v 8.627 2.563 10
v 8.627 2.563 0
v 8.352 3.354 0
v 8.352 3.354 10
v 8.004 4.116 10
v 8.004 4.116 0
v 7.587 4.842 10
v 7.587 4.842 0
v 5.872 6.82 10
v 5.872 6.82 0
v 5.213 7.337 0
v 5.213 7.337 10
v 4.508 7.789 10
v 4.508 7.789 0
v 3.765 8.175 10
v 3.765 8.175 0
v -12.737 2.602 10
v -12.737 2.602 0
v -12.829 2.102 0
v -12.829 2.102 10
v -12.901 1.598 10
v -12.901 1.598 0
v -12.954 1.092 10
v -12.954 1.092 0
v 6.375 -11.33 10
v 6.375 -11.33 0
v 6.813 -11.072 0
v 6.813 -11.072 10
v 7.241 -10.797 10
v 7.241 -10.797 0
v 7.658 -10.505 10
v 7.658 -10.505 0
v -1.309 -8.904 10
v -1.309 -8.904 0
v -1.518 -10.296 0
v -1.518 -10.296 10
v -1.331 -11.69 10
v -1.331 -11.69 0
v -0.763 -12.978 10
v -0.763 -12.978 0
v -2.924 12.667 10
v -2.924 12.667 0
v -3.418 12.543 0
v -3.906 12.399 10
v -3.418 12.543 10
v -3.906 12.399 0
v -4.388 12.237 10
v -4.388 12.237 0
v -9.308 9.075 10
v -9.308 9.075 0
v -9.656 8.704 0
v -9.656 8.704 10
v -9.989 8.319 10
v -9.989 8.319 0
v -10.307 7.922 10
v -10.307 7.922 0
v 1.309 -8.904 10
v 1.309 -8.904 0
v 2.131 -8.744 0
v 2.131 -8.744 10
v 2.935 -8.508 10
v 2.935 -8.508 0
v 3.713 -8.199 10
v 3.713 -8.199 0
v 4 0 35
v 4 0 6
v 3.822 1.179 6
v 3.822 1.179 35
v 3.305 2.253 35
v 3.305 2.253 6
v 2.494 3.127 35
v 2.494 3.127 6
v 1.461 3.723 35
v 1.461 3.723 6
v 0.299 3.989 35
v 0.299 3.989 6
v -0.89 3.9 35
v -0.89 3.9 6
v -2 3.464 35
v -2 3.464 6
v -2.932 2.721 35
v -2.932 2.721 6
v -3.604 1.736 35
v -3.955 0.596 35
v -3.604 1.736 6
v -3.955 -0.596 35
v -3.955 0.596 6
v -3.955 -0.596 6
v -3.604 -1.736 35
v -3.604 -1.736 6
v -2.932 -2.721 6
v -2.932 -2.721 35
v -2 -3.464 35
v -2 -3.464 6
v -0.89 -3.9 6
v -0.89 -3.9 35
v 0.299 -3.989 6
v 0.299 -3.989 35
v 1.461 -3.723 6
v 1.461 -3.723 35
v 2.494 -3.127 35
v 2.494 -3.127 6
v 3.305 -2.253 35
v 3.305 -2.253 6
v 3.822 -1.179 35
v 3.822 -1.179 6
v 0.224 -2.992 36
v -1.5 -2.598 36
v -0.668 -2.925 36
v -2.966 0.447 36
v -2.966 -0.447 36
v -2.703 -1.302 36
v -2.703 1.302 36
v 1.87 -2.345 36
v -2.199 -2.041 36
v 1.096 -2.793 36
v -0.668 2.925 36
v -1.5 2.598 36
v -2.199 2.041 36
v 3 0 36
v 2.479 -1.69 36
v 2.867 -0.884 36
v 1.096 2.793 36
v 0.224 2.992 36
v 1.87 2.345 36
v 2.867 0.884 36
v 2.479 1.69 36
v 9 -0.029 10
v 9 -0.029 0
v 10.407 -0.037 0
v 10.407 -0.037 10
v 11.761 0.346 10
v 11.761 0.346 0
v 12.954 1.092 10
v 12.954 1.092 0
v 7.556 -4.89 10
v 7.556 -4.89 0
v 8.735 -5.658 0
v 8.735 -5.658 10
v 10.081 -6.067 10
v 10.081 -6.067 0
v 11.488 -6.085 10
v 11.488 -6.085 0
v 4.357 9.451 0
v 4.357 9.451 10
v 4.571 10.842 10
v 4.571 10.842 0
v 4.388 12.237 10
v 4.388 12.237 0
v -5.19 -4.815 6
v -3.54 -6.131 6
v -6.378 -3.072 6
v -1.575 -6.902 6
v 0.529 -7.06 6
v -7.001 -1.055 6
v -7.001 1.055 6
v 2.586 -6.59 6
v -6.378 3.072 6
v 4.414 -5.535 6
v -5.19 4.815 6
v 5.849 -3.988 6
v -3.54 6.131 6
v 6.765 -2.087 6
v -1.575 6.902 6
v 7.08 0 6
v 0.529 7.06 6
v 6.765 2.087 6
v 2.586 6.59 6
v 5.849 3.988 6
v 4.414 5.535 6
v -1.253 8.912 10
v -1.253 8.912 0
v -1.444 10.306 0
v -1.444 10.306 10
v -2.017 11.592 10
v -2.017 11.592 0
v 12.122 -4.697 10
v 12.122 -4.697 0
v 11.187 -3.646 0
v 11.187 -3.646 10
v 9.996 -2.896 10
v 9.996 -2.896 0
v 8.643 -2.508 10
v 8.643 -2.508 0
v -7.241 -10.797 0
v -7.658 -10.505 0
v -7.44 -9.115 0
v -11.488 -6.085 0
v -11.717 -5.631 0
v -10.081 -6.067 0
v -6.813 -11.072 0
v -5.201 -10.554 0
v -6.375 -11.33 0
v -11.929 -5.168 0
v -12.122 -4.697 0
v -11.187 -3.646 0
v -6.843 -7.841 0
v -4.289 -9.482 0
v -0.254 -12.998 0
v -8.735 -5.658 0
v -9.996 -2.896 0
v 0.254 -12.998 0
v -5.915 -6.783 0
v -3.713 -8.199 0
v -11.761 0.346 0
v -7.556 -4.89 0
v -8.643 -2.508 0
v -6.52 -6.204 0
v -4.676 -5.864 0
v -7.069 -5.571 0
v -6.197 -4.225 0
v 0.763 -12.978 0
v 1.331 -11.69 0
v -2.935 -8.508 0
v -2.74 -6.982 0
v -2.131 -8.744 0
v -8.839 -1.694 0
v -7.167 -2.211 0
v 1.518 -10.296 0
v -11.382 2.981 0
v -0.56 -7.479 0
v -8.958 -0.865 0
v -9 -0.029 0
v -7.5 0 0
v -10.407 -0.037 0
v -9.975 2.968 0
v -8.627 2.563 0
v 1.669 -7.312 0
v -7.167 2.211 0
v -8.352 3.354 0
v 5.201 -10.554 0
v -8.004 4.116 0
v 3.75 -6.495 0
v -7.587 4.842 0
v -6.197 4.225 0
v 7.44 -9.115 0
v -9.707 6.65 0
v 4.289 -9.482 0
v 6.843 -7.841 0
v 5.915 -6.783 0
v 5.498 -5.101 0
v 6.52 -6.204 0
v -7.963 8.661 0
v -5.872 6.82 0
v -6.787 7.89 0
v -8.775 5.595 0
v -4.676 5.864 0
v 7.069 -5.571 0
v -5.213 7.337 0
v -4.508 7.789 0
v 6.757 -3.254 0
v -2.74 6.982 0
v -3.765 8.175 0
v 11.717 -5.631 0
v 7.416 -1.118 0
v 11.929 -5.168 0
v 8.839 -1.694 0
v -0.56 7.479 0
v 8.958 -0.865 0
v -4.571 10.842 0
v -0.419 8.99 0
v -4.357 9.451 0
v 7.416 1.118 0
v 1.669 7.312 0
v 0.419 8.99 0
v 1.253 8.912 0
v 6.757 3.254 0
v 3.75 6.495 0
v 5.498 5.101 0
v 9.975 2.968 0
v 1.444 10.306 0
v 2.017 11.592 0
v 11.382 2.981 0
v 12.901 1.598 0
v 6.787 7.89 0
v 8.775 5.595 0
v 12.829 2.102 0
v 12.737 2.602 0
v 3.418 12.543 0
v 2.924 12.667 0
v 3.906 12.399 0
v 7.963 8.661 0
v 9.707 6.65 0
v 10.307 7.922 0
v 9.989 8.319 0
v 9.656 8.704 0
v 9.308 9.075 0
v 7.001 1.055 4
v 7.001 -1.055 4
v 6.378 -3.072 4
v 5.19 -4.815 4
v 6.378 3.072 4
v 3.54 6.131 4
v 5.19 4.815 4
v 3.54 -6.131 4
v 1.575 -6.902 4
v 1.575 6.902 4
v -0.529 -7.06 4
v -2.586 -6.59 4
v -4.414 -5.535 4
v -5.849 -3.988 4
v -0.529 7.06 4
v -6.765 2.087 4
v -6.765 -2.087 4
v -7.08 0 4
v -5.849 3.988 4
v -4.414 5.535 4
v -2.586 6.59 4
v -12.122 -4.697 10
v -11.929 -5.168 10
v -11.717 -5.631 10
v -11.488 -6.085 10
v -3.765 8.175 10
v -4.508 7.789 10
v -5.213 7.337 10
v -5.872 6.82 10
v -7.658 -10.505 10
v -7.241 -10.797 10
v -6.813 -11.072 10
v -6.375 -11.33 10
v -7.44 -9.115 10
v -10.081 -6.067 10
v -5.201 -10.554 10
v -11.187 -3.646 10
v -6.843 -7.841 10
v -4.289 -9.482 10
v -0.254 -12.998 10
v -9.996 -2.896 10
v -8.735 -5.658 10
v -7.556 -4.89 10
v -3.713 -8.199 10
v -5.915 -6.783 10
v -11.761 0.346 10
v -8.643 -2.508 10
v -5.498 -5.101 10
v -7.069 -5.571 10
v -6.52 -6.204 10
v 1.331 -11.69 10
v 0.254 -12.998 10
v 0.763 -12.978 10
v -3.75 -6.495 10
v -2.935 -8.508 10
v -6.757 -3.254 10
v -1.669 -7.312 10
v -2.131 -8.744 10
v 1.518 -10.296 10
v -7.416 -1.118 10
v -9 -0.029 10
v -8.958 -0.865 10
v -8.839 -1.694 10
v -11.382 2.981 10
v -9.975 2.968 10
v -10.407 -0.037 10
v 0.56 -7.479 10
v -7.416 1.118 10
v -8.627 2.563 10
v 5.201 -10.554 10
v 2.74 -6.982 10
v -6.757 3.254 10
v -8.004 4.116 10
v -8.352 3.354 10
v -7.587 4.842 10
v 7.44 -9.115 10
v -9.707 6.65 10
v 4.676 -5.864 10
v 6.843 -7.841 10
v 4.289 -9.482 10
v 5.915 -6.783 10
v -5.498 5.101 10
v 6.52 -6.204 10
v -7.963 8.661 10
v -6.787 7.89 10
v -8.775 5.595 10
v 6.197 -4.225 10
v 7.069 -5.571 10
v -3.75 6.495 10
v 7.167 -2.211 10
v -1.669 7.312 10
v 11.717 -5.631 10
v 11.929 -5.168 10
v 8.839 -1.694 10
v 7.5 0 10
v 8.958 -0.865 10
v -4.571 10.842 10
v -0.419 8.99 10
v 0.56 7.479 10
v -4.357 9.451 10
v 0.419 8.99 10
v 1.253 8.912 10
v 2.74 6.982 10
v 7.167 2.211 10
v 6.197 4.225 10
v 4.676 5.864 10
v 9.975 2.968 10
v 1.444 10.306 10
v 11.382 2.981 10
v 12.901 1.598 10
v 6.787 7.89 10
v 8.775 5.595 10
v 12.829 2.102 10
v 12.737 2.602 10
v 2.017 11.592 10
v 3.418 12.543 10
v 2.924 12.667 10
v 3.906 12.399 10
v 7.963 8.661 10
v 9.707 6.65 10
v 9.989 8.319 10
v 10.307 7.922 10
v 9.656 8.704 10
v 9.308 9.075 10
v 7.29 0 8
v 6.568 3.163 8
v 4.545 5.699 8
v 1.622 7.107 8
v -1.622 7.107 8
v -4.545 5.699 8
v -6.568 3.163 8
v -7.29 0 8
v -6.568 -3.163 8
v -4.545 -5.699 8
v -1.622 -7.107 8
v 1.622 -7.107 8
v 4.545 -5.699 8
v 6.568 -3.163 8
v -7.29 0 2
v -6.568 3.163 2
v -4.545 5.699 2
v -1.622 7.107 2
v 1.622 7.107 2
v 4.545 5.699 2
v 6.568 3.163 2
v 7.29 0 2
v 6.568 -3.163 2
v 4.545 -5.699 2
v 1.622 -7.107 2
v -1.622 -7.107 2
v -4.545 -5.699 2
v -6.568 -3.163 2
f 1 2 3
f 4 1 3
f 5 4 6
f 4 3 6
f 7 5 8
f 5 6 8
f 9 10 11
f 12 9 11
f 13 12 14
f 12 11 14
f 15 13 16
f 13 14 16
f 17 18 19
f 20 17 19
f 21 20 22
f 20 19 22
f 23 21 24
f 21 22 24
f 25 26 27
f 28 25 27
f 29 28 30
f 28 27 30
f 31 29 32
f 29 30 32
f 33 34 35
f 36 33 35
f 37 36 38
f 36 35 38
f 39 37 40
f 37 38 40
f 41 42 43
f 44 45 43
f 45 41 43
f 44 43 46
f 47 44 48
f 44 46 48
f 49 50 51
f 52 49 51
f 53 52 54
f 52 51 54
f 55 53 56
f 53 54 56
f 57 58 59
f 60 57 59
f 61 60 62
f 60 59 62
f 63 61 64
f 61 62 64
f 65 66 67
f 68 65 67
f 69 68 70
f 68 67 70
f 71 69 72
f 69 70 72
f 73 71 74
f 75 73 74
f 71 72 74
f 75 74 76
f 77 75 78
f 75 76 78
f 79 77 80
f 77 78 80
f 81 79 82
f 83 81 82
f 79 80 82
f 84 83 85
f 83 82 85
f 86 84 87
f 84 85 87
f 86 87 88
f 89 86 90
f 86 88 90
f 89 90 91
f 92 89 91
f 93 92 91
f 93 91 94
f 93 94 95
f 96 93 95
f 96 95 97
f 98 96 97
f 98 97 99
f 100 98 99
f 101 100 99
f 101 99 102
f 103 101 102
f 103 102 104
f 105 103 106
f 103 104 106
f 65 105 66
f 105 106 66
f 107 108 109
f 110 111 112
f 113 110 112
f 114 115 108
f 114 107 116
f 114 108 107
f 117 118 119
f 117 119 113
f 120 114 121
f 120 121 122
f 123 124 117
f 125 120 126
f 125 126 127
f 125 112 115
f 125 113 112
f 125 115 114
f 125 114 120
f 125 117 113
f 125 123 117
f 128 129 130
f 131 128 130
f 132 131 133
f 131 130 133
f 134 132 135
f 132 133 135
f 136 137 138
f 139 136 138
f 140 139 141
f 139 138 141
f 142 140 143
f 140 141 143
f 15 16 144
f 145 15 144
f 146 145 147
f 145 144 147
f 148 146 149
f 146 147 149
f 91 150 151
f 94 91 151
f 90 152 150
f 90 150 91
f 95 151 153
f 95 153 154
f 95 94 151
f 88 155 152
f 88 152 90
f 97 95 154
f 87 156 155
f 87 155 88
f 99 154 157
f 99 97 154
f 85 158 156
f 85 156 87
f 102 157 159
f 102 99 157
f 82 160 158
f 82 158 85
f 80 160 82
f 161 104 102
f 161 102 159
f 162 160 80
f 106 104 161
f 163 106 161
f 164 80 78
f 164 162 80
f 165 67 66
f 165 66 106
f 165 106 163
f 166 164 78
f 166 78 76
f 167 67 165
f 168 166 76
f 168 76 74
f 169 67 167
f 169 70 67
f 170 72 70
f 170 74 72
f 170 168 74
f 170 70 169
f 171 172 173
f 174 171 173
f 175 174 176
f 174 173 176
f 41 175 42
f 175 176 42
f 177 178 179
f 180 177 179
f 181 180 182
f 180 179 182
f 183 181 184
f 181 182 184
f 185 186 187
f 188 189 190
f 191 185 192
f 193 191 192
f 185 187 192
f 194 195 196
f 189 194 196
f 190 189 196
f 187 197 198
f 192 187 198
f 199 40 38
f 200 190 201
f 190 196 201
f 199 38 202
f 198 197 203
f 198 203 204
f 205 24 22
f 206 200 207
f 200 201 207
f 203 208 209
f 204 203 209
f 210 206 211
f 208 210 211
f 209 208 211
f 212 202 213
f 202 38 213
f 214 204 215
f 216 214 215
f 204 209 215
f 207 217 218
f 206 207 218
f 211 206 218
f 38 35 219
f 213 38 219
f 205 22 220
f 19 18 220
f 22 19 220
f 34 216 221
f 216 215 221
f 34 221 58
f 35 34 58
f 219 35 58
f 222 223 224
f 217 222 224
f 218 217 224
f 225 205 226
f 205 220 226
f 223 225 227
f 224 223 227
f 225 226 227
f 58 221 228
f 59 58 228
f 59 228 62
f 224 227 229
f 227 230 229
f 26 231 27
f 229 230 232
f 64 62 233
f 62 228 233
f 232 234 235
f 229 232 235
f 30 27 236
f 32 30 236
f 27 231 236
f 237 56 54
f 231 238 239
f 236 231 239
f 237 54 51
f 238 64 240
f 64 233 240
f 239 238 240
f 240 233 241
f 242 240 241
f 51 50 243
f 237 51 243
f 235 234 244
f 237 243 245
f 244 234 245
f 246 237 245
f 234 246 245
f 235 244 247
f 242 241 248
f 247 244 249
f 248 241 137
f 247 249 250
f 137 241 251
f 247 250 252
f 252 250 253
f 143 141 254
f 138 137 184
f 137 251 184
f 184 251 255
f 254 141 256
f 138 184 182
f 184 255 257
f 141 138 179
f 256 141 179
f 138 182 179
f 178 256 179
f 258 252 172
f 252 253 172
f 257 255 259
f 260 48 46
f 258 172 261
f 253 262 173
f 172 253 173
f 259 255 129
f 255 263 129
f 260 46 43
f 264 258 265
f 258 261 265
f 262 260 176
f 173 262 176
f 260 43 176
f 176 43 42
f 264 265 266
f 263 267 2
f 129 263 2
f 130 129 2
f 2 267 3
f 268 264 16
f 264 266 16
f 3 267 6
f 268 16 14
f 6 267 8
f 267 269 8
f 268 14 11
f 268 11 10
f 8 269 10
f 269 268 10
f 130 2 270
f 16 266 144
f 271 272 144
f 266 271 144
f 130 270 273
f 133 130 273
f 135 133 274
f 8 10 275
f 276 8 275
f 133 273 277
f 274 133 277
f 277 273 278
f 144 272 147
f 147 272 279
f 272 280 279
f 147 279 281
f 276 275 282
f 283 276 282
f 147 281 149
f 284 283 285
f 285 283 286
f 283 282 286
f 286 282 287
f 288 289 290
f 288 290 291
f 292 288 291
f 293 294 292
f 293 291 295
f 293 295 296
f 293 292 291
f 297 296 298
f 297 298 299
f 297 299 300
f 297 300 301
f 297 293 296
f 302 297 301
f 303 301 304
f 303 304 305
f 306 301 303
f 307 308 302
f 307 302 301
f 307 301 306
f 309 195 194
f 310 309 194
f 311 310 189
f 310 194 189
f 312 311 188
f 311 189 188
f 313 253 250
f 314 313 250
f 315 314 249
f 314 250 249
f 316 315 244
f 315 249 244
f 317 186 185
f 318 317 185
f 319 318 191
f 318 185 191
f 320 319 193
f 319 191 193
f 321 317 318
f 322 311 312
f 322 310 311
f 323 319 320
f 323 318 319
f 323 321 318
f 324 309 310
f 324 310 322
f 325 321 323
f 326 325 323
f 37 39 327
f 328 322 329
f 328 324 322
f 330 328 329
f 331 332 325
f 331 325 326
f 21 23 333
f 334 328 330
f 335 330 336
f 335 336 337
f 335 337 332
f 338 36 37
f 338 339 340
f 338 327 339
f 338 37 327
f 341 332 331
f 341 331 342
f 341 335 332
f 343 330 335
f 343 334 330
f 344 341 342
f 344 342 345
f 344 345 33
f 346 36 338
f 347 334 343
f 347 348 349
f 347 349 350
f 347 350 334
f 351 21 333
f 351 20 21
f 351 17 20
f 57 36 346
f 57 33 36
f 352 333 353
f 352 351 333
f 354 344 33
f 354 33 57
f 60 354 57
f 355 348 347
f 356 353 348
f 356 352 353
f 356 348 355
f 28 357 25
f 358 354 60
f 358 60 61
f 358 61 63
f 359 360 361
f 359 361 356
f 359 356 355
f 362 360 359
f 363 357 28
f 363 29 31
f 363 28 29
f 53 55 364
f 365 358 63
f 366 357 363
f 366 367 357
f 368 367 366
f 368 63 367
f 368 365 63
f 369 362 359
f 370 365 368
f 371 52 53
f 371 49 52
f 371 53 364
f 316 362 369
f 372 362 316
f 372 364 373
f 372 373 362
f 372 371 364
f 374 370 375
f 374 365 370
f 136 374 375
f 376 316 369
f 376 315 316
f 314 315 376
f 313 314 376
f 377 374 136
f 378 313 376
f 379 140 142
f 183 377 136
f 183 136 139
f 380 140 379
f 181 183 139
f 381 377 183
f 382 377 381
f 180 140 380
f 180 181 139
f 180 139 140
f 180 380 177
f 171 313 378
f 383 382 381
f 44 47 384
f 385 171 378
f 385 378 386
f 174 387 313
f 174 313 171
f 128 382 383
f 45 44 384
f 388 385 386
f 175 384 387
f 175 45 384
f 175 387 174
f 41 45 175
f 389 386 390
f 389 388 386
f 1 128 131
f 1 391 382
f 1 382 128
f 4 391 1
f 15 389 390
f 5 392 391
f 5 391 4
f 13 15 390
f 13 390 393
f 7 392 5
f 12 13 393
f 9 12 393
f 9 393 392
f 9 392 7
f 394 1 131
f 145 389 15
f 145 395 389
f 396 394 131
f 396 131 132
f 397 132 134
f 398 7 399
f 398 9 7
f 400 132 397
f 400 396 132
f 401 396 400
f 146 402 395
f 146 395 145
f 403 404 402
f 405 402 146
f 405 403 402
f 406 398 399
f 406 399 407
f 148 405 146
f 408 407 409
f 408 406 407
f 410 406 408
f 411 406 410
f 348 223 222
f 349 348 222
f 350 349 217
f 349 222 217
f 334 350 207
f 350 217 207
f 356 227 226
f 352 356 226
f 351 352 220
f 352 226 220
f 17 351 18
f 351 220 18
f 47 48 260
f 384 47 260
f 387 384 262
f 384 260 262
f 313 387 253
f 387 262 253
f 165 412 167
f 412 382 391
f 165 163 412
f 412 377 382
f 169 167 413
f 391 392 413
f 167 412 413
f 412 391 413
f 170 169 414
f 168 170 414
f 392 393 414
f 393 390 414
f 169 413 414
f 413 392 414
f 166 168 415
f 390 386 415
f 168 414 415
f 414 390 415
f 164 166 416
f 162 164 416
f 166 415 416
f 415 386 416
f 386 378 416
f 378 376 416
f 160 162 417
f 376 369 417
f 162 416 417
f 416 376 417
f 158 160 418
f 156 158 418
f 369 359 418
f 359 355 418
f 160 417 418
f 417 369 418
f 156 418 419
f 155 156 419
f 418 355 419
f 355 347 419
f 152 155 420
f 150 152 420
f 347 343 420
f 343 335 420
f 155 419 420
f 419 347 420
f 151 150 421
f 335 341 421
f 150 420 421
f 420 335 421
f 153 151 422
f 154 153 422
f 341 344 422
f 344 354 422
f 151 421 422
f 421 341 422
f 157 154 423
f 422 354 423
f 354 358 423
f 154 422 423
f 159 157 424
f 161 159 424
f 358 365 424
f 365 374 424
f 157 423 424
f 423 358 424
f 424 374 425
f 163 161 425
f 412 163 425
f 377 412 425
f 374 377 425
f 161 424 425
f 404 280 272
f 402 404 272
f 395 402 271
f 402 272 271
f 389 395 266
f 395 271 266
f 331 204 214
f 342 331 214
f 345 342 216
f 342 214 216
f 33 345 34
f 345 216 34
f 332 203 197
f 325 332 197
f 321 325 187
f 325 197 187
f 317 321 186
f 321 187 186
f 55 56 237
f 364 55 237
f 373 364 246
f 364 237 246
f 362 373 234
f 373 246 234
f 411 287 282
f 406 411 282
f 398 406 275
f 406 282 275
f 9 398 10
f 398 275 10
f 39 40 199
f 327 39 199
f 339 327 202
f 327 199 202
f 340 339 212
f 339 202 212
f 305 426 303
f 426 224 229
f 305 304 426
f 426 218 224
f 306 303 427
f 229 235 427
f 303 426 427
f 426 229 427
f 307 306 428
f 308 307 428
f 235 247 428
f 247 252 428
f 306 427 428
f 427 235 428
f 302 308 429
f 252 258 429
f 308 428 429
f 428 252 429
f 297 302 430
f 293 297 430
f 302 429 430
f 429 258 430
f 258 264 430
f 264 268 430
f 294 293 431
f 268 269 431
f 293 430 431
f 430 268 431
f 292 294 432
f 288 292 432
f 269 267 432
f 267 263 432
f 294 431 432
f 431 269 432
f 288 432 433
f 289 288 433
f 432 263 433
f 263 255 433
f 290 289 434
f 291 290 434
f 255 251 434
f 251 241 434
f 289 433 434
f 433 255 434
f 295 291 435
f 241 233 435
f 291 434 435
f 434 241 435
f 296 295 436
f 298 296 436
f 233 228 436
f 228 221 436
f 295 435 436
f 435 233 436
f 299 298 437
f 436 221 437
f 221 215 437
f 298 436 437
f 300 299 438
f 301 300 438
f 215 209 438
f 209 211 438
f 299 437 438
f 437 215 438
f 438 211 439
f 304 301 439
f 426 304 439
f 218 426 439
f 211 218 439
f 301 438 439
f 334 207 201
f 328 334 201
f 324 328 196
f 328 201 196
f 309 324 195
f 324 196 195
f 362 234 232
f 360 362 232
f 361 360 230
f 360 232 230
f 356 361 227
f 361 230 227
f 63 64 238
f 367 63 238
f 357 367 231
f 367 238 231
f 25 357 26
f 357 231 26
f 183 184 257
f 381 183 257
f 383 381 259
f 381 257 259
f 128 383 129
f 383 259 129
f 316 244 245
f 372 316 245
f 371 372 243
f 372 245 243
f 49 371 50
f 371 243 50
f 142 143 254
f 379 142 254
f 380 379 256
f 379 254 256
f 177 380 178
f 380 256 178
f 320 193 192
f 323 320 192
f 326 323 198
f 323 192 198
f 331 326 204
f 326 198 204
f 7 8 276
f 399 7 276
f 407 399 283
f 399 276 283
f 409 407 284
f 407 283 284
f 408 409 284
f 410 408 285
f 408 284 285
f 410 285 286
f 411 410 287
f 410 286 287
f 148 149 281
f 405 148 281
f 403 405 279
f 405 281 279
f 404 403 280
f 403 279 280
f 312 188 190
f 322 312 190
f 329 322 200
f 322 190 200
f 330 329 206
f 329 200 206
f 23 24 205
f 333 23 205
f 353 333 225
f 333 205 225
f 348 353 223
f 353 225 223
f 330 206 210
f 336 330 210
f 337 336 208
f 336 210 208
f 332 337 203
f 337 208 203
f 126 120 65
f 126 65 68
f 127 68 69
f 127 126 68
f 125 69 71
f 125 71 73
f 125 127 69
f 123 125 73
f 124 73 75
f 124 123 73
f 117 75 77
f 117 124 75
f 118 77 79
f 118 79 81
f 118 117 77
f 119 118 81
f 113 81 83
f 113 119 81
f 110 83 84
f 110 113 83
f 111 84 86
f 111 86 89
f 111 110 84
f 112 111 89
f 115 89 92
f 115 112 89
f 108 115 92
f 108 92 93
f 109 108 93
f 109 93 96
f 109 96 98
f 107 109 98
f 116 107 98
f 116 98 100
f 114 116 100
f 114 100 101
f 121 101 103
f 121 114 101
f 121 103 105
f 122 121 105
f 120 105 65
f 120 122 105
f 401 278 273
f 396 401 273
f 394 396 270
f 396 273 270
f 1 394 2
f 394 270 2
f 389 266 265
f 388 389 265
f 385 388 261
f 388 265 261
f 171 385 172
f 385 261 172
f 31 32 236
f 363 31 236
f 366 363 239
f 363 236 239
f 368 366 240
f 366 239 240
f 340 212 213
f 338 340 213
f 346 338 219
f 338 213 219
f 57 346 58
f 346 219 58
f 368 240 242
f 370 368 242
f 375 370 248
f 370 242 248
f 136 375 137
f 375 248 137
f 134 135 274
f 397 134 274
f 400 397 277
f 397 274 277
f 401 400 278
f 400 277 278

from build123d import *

# Parameters (mm, degrees)
SKETCH_1_R               = 13
EXTRUDE_1_DEPTH          = 10
CUT_EXTRUDE_START        = -10
CUT_EXTRUDE_1_DEPTH      = 10
PATTERN_CIRCULAR_3_COUNT = 11
SKETCH_3_R               = 7.5
CUT_EXTRUDE_2_DEPTH      = 4
CUT_EXTRUDE_2_DRAFT      = -6
SKETCH_4_R               = 7.5
CUT_EXTRUDE_3_DEPTH      = 4
CUT_EXTRUDE_3_DRAFT      = -6
SKETCH_5_R               = 4
EXTRUDE_2_DEPTH          = 30
CHAMFER_1_SIZE           = 1


with BuildPart() as part:
    # Эскиз1 → Бобышка-Вытянуть1 (new body)
    with BuildSketch(Plane.XY):
        Circle(SKETCH_1_R)
    extrude(amount=EXTRUDE_1_DEPTH)

    # Эскиз2 → Вырез-Вытянуть1 (cut)
    with BuildSketch(Plane.XY.offset(10).offset(CUT_EXTRUDE_START)):
        with BuildLine():
            ThreePointArc((1.252557909, 8.912412619), (0, 9), (-1.252557909, 8.912412619))
            ThreePointArc((-1.252557909, 8.912412619), (-1.684886314, 10.969320472), (-2.924363706, 12.666810842))
            ThreePointArc((-2.924363706, 12.666810842), (0, 13), (2.924363706, 12.666810842))
            ThreePointArc((2.924363706, 12.666810842), (1.684886314, 10.969320472), (1.252557909, 8.912412619))
        make_face()
    cut_extrude_1 = extrude(amount=CUT_EXTRUDE_1_DEPTH, mode=Mode.SUBTRACT)

    # Круговой массив3: Вырез-Вытянуть1 ×11 about axis
    pattern_circular_3_axis = Axis((0, 0, 0), (0, 0, 1))
    for i in range(1, PATTERN_CIRCULAR_3_COUNT):
        add(cut_extrude_1.rotate(pattern_circular_3_axis, i * 360 / PATTERN_CIRCULAR_3_COUNT), mode=Mode.SUBTRACT)


with BuildPart() as cut_extrude_2_tool:
    # Эскиз3 → Вырез-Вытянуть2 (with draft: the straight prism first)
    with BuildSketch(Plane.XY.offset(10)):
        Circle(SKETCH_3_R)
    extrude(amount=-CUT_EXTRUDE_2_DEPTH)
    # Вырез-Вытянуть2: the draft: its side faces are tilted about the plane it starts from
    cut_extrude_2_sides = [cut_extrude_2_tool.faces().sort_by_distance(p)[0] for p in [
        (-7.5, 0, 8),
    ]]
    draft(cut_extrude_2_sides, Plane.XY.offset(10), CUT_EXTRUDE_2_DRAFT)


with BuildPart() as part_1:
    add(part.part)

    # Вырез-Вытянуть2: cut by cut_extrude_2_tool
    add(cut_extrude_2_tool.part, mode=Mode.SUBTRACT)


with BuildPart() as cut_extrude_3_tool:
    # Эскиз4 → Вырез-Вытянуть3 (with draft: the straight prism first)
    with BuildSketch(Plane(origin=(0, 0, 0), x_dir=(-1, 0, 0), z_dir=(0, 0, -1))):
        Circle(SKETCH_4_R)
    extrude(amount=-CUT_EXTRUDE_3_DEPTH)
    # Вырез-Вытянуть3: the draft: its side faces are tilted about the plane it starts from
    cut_extrude_3_sides = [cut_extrude_3_tool.faces().sort_by_distance(p)[0] for p in [
        (7.5, 0, 2),
    ]]
    draft(cut_extrude_3_sides, Plane(origin=(0, 0, 0), x_dir=(-1, 0, 0), z_dir=(0, 0, -1)), CUT_EXTRUDE_3_DRAFT)


with BuildPart() as part_2:
    add(part_1.part)

    # Вырез-Вытянуть3: cut by cut_extrude_3_tool
    add(cut_extrude_3_tool.part, mode=Mode.SUBTRACT)

    # Эскиз5 → Бобышка-Вытянуть2 (add)
    with BuildSketch(Plane.XY.offset(6)):
        Circle(SKETCH_5_R)
    extrude(amount=EXTRUDE_2_DEPTH)

    # Фаска1
    chamfer_1_edges = [part_2.edges().sort_by_distance(p)[0] for p in [
        (-4, 0, 36),
    ]]
    chamfer(chamfer_1_edges, length=CHAMFER_1_SIZE)


solid = part_2.part
